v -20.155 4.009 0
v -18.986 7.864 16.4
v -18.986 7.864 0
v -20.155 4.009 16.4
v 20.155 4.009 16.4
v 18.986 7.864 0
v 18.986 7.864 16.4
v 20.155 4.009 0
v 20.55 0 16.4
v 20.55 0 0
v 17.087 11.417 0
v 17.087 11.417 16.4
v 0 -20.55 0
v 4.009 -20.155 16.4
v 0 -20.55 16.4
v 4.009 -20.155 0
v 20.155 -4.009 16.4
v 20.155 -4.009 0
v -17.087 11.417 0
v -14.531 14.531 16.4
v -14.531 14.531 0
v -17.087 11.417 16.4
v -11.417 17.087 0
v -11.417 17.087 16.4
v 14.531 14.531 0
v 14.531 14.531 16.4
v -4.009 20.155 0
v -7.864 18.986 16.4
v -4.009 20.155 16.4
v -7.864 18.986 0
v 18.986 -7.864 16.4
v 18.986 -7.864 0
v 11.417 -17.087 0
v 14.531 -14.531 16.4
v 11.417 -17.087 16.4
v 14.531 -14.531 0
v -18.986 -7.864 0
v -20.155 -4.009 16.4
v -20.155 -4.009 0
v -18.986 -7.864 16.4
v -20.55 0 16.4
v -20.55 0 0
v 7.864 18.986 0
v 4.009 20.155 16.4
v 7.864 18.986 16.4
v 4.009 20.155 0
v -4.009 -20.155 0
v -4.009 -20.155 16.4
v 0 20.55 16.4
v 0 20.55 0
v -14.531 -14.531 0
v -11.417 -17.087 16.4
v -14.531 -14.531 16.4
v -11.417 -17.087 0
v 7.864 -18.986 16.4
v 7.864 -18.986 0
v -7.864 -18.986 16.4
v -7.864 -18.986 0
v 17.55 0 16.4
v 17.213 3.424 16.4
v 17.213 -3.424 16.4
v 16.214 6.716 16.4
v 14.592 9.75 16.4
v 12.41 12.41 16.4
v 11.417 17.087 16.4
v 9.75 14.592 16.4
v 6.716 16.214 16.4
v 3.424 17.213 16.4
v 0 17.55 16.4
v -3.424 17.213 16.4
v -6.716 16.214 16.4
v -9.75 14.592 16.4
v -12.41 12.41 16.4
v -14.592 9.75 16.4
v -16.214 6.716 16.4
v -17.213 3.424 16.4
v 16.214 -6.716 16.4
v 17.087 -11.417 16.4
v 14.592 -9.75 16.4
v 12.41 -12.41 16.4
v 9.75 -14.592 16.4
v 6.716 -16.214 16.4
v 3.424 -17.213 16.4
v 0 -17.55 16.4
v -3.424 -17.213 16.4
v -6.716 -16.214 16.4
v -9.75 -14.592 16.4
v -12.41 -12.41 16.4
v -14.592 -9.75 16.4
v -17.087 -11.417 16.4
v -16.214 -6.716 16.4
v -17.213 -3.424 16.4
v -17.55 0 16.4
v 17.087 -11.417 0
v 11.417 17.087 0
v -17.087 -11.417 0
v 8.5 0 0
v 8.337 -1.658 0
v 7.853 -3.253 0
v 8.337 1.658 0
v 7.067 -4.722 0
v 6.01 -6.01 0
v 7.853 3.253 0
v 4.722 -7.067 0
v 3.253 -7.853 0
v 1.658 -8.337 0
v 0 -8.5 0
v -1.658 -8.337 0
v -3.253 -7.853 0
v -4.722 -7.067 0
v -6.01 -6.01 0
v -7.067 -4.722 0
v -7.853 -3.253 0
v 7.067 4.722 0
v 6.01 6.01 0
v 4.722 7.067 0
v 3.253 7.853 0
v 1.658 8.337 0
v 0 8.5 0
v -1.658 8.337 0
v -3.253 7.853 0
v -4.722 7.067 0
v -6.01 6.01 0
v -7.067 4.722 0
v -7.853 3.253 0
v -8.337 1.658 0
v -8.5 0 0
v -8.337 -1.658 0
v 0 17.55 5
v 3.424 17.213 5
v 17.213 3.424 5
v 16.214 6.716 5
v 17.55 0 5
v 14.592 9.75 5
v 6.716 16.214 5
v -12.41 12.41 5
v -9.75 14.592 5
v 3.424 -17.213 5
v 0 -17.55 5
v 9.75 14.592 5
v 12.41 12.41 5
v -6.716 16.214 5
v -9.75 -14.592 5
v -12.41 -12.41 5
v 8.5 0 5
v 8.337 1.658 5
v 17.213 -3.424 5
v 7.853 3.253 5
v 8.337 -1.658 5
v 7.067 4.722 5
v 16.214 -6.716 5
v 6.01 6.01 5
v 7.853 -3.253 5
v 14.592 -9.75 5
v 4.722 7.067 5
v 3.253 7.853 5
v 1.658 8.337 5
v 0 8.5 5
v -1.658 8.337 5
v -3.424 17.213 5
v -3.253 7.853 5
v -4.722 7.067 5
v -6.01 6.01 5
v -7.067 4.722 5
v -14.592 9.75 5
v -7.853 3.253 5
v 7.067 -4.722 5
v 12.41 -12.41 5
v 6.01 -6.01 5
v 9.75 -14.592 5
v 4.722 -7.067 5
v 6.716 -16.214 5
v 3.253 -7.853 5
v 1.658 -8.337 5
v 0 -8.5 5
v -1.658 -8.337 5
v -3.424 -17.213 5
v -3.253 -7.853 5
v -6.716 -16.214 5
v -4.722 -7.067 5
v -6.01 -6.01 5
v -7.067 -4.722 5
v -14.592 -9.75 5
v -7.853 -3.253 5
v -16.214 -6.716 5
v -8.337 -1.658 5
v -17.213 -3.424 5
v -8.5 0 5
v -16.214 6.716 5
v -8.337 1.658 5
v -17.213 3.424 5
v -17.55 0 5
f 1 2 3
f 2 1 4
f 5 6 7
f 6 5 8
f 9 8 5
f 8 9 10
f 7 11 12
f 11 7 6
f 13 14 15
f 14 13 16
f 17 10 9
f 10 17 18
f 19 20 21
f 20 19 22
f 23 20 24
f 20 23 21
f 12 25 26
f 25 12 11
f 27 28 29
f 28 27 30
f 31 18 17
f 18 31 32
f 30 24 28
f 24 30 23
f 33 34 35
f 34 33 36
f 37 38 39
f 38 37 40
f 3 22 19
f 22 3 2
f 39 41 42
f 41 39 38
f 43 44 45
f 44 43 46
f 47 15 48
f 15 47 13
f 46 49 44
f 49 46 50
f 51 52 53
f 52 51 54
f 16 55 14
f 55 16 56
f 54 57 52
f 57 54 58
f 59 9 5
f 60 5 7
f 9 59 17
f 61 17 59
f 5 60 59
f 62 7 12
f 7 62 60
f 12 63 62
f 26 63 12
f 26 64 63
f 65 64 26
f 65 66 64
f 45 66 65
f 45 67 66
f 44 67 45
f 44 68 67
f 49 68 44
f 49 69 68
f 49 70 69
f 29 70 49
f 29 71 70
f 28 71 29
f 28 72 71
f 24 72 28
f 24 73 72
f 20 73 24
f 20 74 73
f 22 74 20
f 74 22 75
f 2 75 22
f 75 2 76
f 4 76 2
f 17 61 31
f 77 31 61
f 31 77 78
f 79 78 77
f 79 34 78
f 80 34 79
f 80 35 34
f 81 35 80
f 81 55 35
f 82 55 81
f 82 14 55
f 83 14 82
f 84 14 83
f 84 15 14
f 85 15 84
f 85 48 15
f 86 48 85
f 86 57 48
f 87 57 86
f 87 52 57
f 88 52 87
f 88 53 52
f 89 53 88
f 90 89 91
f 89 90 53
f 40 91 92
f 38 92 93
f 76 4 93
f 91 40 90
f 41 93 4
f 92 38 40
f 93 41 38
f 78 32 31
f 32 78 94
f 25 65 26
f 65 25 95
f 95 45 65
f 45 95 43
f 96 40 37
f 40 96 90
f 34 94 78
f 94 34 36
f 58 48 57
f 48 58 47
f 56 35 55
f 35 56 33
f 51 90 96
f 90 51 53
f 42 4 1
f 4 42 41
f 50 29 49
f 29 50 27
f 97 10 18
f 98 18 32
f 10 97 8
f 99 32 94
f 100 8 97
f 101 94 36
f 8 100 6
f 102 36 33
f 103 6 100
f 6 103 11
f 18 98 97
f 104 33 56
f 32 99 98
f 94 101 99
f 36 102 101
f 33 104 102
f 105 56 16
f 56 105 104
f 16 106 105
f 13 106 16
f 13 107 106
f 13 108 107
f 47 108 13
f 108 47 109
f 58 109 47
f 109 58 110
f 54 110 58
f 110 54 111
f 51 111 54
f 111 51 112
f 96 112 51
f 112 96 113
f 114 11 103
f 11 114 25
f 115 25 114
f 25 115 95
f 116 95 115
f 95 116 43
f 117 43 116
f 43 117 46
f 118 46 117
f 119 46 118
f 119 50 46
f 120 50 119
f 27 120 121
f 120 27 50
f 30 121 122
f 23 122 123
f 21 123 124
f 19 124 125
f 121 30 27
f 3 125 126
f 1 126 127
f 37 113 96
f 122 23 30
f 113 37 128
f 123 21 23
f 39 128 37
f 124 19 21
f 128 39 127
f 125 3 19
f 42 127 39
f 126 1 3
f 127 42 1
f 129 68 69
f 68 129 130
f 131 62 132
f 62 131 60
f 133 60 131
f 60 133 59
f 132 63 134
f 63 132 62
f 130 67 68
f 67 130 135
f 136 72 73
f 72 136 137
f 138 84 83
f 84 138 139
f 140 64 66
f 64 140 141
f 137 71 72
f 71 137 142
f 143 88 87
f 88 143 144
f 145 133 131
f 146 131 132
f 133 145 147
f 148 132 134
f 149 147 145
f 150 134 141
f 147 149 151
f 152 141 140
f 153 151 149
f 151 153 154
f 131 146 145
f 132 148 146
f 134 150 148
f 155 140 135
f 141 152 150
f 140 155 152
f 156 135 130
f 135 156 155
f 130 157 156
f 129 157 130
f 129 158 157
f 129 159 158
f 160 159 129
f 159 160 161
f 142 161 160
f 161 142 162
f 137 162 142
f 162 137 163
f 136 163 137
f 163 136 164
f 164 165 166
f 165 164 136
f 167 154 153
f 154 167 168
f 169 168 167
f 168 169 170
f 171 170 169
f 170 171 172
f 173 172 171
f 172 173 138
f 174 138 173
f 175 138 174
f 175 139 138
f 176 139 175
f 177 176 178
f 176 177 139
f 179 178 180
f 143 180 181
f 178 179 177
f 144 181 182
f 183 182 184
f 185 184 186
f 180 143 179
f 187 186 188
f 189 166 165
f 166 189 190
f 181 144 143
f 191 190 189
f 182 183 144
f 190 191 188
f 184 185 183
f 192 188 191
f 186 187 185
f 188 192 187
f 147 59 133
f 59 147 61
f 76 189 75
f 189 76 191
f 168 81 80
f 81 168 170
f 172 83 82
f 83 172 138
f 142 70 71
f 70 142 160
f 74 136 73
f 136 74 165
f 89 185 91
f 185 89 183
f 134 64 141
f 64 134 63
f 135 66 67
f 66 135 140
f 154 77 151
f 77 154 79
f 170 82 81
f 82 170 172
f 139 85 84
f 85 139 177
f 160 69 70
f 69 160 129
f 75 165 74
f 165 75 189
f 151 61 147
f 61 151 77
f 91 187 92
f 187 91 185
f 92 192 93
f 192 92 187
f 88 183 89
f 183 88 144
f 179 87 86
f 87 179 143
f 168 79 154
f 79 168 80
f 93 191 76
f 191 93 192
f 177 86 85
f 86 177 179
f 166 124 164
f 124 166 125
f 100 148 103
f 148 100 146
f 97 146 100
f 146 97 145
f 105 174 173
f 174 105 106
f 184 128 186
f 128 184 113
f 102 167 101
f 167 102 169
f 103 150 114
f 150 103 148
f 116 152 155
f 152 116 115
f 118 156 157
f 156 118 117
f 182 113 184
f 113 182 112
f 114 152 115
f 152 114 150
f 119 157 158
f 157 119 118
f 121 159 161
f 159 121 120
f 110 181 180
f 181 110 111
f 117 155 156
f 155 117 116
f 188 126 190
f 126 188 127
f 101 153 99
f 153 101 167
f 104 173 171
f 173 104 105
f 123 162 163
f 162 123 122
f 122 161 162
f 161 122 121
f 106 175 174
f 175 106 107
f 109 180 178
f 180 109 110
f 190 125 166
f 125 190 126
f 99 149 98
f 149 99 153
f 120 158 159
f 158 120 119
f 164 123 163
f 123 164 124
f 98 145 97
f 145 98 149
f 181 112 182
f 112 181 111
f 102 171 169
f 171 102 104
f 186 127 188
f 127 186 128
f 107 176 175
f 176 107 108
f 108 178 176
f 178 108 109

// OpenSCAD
$fn = 32;

// ----------------------------------------------------------------------
// Bearing housing: seat for 6202 (35 x 11 mm), 41.1 mm body
// ----------------------------------------------------------------------

// --- parameters (mm) ---
case_d = 41.1;            // housing outside diameter
case_h = 16.4;            // overall housing height
rim_t = 3;                // wall thickness
bearing_seat = 35.1;      // 6202 seat, 0.1 mm clearance
seat_h = 11.4;            // pocket depth
shoulder = 5;             // shoulder under the bearing
pass_d = 17;              // shaft passage

module body() {
  cylinder(h = case_h, d = case_d);
}

difference() {
  union() {
    body();
  }
  translate([0, 0, case_h - seat_h]) cylinder(h = seat_h + 1, d = bearing_seat);
  translate([0, 0, -1]) cylinder(h = case_h - seat_h + 1, d = pass_d);
}
